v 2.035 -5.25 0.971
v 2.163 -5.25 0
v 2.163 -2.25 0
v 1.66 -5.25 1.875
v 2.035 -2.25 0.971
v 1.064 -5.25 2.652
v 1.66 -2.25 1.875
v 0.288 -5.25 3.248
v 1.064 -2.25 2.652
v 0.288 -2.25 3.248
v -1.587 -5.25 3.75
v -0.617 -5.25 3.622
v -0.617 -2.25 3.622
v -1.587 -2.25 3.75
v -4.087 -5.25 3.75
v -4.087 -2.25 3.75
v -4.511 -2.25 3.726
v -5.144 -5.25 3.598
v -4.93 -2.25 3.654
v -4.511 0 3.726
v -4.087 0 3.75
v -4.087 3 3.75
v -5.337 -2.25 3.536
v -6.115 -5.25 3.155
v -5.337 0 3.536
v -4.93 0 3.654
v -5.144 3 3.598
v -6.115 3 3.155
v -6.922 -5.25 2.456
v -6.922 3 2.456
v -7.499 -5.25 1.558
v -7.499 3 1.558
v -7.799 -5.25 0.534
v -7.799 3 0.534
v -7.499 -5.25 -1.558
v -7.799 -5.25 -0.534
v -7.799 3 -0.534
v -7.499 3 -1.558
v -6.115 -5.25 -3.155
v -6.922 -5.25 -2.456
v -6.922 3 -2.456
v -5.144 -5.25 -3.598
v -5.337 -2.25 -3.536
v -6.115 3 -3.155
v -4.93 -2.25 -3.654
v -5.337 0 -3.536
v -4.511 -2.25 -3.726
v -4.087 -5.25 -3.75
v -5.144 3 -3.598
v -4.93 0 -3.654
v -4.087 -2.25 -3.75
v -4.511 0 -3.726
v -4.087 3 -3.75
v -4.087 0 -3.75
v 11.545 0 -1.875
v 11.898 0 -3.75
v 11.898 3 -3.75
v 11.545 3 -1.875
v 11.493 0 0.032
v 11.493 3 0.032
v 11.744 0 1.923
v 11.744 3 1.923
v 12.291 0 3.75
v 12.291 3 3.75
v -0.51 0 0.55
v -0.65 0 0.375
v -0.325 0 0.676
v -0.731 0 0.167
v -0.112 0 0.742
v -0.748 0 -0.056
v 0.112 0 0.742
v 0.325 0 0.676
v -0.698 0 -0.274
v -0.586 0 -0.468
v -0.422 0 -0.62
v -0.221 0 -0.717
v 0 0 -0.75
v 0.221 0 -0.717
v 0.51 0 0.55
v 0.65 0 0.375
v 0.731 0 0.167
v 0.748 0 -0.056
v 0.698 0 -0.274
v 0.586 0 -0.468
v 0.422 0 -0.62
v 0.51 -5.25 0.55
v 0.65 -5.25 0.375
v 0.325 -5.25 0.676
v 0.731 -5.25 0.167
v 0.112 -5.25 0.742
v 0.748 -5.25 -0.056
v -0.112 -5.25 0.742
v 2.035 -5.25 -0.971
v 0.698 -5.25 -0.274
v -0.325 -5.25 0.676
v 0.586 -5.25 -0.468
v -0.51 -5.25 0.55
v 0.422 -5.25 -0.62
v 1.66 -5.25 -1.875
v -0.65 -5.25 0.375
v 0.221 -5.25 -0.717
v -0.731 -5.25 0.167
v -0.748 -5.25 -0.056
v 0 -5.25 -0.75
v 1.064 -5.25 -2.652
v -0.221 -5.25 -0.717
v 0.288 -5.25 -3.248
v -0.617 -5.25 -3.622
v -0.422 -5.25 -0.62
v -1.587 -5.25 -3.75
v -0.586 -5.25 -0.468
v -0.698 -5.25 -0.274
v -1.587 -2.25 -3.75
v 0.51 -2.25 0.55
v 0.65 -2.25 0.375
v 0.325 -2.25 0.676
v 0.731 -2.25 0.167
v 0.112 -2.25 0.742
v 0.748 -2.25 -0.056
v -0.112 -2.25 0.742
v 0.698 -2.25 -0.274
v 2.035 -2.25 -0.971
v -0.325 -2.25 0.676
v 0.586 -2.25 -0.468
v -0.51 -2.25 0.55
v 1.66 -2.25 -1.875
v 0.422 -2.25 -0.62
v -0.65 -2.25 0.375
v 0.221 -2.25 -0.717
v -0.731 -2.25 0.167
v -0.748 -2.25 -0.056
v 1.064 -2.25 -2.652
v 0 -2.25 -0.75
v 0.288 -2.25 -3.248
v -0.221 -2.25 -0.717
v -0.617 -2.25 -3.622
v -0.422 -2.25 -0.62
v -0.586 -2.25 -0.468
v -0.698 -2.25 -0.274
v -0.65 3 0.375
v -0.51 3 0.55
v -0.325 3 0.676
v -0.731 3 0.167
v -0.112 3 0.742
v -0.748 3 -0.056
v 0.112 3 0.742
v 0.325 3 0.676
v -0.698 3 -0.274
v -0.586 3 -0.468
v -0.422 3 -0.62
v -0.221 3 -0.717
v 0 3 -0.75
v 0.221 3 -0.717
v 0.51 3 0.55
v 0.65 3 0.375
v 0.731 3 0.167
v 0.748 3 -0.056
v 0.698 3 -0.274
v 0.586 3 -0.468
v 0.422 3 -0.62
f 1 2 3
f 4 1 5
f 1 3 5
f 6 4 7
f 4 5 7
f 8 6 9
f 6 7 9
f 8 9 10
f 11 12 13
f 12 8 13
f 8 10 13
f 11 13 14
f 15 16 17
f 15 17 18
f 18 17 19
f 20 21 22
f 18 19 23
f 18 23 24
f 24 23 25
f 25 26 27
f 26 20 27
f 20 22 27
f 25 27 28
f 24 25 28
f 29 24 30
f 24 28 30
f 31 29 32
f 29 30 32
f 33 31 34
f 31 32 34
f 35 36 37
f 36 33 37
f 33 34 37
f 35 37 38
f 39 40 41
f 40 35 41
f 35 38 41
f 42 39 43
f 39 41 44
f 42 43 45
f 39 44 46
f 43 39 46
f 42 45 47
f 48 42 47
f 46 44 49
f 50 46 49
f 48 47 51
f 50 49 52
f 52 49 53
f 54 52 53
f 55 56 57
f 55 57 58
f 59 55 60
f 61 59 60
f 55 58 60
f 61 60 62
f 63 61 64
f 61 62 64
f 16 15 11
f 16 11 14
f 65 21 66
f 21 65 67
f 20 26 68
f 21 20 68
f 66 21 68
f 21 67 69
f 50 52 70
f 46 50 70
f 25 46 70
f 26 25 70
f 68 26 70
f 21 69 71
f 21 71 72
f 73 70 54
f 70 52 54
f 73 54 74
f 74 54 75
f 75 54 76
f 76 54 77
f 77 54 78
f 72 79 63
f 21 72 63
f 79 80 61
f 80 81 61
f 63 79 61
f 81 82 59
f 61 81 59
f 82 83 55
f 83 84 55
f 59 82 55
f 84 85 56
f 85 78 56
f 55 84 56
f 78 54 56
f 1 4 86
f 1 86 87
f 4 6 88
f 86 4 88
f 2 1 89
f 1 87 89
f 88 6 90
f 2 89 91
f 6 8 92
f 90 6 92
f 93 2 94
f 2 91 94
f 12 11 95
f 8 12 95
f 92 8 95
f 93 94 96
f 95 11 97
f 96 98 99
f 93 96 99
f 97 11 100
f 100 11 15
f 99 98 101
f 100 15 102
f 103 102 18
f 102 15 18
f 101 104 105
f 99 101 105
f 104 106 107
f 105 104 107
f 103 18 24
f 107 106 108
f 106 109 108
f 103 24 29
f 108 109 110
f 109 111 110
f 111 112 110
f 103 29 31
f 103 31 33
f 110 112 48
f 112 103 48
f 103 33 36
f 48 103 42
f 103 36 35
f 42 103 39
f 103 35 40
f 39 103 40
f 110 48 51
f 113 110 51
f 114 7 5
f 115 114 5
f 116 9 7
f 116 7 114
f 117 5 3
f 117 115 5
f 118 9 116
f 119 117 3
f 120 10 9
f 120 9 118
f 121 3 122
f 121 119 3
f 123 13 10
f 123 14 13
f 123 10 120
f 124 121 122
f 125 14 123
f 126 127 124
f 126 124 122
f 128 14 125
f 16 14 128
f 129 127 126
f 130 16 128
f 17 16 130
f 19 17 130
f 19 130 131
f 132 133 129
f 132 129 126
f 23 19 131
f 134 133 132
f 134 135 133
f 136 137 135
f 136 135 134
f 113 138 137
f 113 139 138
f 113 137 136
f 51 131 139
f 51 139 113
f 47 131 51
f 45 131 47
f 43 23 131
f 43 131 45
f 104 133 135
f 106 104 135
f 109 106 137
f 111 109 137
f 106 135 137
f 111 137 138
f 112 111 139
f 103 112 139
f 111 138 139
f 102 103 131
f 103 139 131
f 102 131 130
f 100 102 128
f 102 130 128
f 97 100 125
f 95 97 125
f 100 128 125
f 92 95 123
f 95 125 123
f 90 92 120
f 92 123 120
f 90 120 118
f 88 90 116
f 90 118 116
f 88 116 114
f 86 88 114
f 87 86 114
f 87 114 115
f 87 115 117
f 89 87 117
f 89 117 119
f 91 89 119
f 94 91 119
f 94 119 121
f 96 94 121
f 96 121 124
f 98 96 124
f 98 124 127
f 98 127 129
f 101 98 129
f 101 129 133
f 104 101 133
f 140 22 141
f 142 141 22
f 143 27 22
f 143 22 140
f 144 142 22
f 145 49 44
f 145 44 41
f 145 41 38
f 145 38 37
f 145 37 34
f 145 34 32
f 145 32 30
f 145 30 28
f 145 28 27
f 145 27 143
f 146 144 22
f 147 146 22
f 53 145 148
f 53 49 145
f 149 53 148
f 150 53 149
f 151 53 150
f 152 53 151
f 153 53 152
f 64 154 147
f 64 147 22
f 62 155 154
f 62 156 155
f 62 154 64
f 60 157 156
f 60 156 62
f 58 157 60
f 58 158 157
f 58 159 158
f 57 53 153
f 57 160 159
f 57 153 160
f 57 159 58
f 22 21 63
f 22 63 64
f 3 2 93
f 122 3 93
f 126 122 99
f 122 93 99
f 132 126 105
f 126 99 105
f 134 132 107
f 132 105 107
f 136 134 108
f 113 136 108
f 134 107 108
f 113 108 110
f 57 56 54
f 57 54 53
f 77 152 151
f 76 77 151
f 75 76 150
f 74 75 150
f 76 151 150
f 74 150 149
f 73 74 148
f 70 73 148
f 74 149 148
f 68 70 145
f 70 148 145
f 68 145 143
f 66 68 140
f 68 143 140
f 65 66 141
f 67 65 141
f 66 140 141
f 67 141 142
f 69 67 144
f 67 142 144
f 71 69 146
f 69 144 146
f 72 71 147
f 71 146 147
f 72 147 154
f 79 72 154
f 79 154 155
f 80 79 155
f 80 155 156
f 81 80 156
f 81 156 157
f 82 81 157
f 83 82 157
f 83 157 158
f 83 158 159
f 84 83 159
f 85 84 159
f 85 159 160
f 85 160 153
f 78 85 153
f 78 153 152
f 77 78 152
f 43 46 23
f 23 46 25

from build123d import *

# Parameters (mm, degrees)
SKETCH1_W           = 18.396209947
SKETCH1_H           = 7.5
BOSS_EXTRUDE1_DEPTH = 3
SKETCH3_W           = 7.837448939
SKETCH3_H           = 7.5
BOSS_EXTRUDE2_DEPTH = 3
SKETCH4_R           = 12
CUT_EXTRUDE2_DEPTH  = 3
SKETCH6_W           = 2.5
SKETCH6_H           = 7.5
BOSS_EXTRUDE3_DEPTH = 5.25
SKETCH7_W           = 7.5
SKETCH7_H           = 3
BOSS_EXTRUDE4_DEPTH = 7.5
CUT_EXTRUDE1_REACH  = 17.271
SKETCH2_R           = 0.75
FILLET1_R           = 3.75


with BuildPart() as part:
    # Sketch1 → Boss-Extrude1 (new body)
    with BuildSketch(Plane(origin=(0, 0, 0), x_dir=(1, 0, 0), z_dir=(0, 1, 0))):
        with Locations((9.198104974, 0)):
            Rectangle(SKETCH1_W, SKETCH1_H)
    extrude(amount=BOSS_EXTRUDE1_DEPTH)

    # Sketch3 → Boss-Extrude2 (add)
    with BuildSketch(Plane(origin=(0, 3, 0), x_dir=(1, 0, 0), z_dir=(0, 1, 0))):
        with Locations((-3.91872447, 0)):
            Rectangle(SKETCH3_W, SKETCH3_H)
    extrude(amount=-BOSS_EXTRUDE2_DEPTH)

    # Sketch4 → Cut-Extrude2 (cut)
    with BuildSketch(Plane(origin=(0, 3, 0), x_dir=(1, 0, 0), z_dir=(0, 1, 0))):
        with Locations((23.476391496, 0.596984019)):
            Circle(SKETCH4_R)
    extrude(amount=-CUT_EXTRUDE2_DEPTH, mode=Mode.SUBTRACT)

    # Sketch6 → Boss-Extrude3 (add)
    with BuildSketch(Plane.XZ):
        with Locations((-6.587448939, 0)):
            Rectangle(SKETCH6_W, SKETCH6_H)
    extrude(amount=BOSS_EXTRUDE3_DEPTH)

    # Sketch7 → Boss-Extrude4 (add)
    with BuildSketch(Plane(origin=(-5.337448939, 0, 0), x_dir=(0, 0, -1), z_dir=(1, 0, 0))):
        with Locations((0, -3.75)):
            Rectangle(SKETCH7_W, SKETCH7_H)
    extrude(amount=BOSS_EXTRUDE4_DEPTH)

    # Cut-Extrude1: up to this face of the body (flat: up to its plane)
    cut_extrude1_end = Plane(part.part.faces().sort_by_distance((-2.837448939, -5.25, 0))[0])
    # Sketch2 → Cut-Extrude1 (cut, up to the picked face)
    with BuildSketch(Plane(origin=(0, 3, 0), x_dir=(1, 0, 0), z_dir=(0, 1, 0)), mode=Mode.PRIVATE) as cut_extrude1_sk1:
        with Locations(Location((0, 0, 0), (0, 0, 90))):
            Circle(SKETCH2_R)
    cut_extrude1_tool1 = split(extrude(cut_extrude1_sk1.sketch, amount=-CUT_EXTRUDE1_REACH, mode=Mode.PRIVATE), bisect_by=cut_extrude1_end, keep=Keep.BOTH, mode=Mode.PRIVATE)
    add(cut_extrude1_tool1.solids().sort_by(Axis((0, 3, 0), (0, -1, 0)))[0], mode=Mode.SUBTRACT)

    # Fillet1
    # the kernel refuses this fillet: 3.75 mm, written as the material it takes off along each edge
    with BuildSketch(Plane(origin=(2.162551061, -14.625, -3.75), x_dir=(0, 0, 1), z_dir=(0, 1, 0))) as fillet1_piece_1:
        with BuildLine():
            CenterArc((FILLET1_R, -FILLET1_R), FILLET1_R, 90, 90)
            Line((0, -FILLET1_R), (0, 0))
            Line((0, 0), (FILLET1_R, 0))
        make_face()
    extrude(amount=12.375, mode=Mode.SUBTRACT)
    with BuildSketch(Plane(origin=(2.162551061, -2.25, 3.75), x_dir=(-1, 0, 0), z_dir=(0, -1, 0))) as fillet1_piece_2:
        with BuildLine():
            CenterArc((FILLET1_R, FILLET1_R), FILLET1_R, 180, 90)
            Line((0, FILLET1_R), (0, 0))
            Line((0, 0), (FILLET1_R, 0))
        make_face()
    extrude(amount=12.375, mode=Mode.SUBTRACT)
    with BuildSketch(Plane(origin=(-7.837448939, 12.375, 3.75), x_dir=(1, 0, 0), z_dir=(0, -1, 0)), Plane(origin=(-7.837448939, 12.375, -3.75), x_dir=(0, 0, 1), z_dir=(0, -1, 0))) as fillet1_piece_3:
        with BuildLine():
            CenterArc((FILLET1_R, -FILLET1_R), FILLET1_R, 90, 90)
            Line((0, -FILLET1_R), (0, 0))
            Line((0, 0), (FILLET1_R, 0))
        make_face()
    extrude(amount=27, mode=Mode.SUBTRACT)


solid = part.part
